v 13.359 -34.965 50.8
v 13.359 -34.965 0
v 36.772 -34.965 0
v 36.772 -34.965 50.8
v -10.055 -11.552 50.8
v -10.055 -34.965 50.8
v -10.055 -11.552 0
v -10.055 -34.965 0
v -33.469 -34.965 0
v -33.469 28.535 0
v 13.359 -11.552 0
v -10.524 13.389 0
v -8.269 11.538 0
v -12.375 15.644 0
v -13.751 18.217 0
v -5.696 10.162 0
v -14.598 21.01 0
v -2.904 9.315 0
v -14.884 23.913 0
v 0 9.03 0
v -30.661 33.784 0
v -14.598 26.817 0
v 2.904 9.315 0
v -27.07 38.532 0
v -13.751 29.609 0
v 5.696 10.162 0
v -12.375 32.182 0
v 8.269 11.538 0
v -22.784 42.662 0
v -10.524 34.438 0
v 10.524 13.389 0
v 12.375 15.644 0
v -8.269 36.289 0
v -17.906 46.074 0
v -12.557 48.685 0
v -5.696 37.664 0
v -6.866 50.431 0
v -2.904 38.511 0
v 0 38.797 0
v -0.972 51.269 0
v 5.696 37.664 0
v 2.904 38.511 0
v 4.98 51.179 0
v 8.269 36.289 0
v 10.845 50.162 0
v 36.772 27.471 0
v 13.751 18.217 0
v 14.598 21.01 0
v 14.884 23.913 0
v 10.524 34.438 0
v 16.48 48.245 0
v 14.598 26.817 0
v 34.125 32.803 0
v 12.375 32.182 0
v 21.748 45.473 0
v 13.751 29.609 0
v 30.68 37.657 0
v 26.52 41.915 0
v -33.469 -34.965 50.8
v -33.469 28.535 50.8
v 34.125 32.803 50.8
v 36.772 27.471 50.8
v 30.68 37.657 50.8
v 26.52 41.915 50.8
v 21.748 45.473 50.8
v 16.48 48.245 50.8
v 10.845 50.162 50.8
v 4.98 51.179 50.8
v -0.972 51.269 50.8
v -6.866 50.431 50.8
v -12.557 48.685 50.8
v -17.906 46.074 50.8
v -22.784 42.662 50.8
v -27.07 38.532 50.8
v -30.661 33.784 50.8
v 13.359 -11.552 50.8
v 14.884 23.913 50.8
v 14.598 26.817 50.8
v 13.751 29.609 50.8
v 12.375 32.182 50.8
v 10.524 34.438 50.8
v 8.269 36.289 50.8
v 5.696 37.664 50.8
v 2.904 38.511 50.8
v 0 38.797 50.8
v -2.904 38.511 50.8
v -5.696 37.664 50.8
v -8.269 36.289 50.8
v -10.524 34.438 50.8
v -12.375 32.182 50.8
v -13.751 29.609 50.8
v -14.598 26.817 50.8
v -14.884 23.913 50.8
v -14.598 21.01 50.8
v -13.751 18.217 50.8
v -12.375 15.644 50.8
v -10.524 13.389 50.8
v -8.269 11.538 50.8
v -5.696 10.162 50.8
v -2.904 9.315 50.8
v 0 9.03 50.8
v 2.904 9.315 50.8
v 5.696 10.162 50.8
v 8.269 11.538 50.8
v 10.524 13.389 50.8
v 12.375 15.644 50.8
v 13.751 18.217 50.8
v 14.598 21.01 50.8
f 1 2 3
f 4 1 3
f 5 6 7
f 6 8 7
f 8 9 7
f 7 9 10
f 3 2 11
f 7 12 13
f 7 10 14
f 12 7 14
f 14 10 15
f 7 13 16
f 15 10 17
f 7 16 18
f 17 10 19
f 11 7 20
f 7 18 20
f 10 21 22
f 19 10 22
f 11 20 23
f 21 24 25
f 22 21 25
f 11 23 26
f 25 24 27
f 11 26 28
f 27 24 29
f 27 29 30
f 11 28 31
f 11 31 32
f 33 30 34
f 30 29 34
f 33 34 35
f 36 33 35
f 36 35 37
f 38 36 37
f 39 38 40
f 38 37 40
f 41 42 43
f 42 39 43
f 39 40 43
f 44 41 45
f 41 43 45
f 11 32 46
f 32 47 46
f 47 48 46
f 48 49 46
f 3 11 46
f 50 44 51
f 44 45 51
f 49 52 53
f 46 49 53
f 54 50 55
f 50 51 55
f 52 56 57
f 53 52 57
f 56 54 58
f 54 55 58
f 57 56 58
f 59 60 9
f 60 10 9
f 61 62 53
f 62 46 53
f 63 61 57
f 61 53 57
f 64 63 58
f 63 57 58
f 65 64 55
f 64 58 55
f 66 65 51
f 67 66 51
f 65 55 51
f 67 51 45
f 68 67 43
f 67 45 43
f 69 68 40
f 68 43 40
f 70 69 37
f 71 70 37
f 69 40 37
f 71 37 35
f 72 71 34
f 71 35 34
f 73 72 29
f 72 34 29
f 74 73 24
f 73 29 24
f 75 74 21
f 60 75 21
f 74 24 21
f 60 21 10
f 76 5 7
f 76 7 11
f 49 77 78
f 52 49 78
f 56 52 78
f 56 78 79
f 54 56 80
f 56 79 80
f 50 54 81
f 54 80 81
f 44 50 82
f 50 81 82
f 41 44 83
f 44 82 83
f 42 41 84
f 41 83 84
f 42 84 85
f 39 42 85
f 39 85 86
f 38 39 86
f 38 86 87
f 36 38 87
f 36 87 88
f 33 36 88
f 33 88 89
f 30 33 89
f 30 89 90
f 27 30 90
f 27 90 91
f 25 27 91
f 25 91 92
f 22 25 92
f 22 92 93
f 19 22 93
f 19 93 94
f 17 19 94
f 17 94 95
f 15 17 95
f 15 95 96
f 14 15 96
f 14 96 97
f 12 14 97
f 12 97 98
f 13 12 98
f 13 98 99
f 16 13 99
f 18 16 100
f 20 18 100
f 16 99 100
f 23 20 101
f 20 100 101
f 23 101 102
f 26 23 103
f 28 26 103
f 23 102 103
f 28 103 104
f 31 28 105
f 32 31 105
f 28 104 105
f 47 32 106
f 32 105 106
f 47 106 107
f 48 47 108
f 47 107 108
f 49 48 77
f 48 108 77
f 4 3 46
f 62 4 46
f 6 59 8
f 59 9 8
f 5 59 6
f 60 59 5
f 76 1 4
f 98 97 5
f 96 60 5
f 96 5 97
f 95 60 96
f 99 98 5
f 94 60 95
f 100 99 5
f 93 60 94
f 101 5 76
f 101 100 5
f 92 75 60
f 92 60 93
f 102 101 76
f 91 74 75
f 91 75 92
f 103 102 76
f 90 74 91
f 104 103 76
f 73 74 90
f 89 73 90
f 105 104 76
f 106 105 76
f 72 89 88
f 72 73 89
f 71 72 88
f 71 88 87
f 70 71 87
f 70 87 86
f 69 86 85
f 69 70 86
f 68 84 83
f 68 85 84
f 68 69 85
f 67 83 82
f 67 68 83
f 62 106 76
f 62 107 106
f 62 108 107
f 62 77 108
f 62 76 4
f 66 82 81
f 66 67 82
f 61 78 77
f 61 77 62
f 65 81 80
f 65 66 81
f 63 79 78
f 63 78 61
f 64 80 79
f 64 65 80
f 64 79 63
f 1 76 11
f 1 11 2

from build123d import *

# Parameters (mm, degrees)
F1_DEPTH = 25.4
F2_DEPTH = 25.4
F3_R     = 14.8837402169
F4_DEPTH = 50.801


with BuildPart() as f1:
    # F0 (on Top) → F1 (new body)
    with BuildSketch(Plane.XY):
        with BuildLine():
            Line((36.7723161906, -34.965459034), (36.7723161906, 27.4711334495))
            ThreePointArc((36.7723161906, 27.4711334495), (2.0053244918, 51.3401081734), (-33.4688444361, 28.5353936383))
            Line((-33.4688444361, 28.5353936383), (-33.4688444361, -34.965459034))
            Line((-33.4688444361, -34.965459034), (-10.0551242272, -34.965459034))
            Line((-10.0551242272, -34.965459034), (-10.0551242272, -11.5517388251))
            Line((-10.0551242272, -11.5517388251), (13.3585959817, -11.5517388251))
            Line((13.3585959817, -11.5517388251), (13.3585959817, -34.965459034))
            Line((13.3585959817, -34.965459034), (36.7723161906, -34.965459034))
        make_face()
    extrude(amount=F1_DEPTH)

    # F2 (add): a face of the model
    f2_faces = [f1.faces().sort_by_distance(p)[0] for p in [
        (1.5994102658, 8.2877292007, 25.4),
    ]]
    extrude(f2_faces, amount=F2_DEPTH)

    # F3 (on face) → F4 (cut, through all)
    with BuildSketch(Plane.XY.offset(50.8)):
        with Locations((0, 23.9132437855)):
            Circle(F3_R)
    extrude(amount=-F4_DEPTH, mode=Mode.SUBTRACT)


solid = f1.part
